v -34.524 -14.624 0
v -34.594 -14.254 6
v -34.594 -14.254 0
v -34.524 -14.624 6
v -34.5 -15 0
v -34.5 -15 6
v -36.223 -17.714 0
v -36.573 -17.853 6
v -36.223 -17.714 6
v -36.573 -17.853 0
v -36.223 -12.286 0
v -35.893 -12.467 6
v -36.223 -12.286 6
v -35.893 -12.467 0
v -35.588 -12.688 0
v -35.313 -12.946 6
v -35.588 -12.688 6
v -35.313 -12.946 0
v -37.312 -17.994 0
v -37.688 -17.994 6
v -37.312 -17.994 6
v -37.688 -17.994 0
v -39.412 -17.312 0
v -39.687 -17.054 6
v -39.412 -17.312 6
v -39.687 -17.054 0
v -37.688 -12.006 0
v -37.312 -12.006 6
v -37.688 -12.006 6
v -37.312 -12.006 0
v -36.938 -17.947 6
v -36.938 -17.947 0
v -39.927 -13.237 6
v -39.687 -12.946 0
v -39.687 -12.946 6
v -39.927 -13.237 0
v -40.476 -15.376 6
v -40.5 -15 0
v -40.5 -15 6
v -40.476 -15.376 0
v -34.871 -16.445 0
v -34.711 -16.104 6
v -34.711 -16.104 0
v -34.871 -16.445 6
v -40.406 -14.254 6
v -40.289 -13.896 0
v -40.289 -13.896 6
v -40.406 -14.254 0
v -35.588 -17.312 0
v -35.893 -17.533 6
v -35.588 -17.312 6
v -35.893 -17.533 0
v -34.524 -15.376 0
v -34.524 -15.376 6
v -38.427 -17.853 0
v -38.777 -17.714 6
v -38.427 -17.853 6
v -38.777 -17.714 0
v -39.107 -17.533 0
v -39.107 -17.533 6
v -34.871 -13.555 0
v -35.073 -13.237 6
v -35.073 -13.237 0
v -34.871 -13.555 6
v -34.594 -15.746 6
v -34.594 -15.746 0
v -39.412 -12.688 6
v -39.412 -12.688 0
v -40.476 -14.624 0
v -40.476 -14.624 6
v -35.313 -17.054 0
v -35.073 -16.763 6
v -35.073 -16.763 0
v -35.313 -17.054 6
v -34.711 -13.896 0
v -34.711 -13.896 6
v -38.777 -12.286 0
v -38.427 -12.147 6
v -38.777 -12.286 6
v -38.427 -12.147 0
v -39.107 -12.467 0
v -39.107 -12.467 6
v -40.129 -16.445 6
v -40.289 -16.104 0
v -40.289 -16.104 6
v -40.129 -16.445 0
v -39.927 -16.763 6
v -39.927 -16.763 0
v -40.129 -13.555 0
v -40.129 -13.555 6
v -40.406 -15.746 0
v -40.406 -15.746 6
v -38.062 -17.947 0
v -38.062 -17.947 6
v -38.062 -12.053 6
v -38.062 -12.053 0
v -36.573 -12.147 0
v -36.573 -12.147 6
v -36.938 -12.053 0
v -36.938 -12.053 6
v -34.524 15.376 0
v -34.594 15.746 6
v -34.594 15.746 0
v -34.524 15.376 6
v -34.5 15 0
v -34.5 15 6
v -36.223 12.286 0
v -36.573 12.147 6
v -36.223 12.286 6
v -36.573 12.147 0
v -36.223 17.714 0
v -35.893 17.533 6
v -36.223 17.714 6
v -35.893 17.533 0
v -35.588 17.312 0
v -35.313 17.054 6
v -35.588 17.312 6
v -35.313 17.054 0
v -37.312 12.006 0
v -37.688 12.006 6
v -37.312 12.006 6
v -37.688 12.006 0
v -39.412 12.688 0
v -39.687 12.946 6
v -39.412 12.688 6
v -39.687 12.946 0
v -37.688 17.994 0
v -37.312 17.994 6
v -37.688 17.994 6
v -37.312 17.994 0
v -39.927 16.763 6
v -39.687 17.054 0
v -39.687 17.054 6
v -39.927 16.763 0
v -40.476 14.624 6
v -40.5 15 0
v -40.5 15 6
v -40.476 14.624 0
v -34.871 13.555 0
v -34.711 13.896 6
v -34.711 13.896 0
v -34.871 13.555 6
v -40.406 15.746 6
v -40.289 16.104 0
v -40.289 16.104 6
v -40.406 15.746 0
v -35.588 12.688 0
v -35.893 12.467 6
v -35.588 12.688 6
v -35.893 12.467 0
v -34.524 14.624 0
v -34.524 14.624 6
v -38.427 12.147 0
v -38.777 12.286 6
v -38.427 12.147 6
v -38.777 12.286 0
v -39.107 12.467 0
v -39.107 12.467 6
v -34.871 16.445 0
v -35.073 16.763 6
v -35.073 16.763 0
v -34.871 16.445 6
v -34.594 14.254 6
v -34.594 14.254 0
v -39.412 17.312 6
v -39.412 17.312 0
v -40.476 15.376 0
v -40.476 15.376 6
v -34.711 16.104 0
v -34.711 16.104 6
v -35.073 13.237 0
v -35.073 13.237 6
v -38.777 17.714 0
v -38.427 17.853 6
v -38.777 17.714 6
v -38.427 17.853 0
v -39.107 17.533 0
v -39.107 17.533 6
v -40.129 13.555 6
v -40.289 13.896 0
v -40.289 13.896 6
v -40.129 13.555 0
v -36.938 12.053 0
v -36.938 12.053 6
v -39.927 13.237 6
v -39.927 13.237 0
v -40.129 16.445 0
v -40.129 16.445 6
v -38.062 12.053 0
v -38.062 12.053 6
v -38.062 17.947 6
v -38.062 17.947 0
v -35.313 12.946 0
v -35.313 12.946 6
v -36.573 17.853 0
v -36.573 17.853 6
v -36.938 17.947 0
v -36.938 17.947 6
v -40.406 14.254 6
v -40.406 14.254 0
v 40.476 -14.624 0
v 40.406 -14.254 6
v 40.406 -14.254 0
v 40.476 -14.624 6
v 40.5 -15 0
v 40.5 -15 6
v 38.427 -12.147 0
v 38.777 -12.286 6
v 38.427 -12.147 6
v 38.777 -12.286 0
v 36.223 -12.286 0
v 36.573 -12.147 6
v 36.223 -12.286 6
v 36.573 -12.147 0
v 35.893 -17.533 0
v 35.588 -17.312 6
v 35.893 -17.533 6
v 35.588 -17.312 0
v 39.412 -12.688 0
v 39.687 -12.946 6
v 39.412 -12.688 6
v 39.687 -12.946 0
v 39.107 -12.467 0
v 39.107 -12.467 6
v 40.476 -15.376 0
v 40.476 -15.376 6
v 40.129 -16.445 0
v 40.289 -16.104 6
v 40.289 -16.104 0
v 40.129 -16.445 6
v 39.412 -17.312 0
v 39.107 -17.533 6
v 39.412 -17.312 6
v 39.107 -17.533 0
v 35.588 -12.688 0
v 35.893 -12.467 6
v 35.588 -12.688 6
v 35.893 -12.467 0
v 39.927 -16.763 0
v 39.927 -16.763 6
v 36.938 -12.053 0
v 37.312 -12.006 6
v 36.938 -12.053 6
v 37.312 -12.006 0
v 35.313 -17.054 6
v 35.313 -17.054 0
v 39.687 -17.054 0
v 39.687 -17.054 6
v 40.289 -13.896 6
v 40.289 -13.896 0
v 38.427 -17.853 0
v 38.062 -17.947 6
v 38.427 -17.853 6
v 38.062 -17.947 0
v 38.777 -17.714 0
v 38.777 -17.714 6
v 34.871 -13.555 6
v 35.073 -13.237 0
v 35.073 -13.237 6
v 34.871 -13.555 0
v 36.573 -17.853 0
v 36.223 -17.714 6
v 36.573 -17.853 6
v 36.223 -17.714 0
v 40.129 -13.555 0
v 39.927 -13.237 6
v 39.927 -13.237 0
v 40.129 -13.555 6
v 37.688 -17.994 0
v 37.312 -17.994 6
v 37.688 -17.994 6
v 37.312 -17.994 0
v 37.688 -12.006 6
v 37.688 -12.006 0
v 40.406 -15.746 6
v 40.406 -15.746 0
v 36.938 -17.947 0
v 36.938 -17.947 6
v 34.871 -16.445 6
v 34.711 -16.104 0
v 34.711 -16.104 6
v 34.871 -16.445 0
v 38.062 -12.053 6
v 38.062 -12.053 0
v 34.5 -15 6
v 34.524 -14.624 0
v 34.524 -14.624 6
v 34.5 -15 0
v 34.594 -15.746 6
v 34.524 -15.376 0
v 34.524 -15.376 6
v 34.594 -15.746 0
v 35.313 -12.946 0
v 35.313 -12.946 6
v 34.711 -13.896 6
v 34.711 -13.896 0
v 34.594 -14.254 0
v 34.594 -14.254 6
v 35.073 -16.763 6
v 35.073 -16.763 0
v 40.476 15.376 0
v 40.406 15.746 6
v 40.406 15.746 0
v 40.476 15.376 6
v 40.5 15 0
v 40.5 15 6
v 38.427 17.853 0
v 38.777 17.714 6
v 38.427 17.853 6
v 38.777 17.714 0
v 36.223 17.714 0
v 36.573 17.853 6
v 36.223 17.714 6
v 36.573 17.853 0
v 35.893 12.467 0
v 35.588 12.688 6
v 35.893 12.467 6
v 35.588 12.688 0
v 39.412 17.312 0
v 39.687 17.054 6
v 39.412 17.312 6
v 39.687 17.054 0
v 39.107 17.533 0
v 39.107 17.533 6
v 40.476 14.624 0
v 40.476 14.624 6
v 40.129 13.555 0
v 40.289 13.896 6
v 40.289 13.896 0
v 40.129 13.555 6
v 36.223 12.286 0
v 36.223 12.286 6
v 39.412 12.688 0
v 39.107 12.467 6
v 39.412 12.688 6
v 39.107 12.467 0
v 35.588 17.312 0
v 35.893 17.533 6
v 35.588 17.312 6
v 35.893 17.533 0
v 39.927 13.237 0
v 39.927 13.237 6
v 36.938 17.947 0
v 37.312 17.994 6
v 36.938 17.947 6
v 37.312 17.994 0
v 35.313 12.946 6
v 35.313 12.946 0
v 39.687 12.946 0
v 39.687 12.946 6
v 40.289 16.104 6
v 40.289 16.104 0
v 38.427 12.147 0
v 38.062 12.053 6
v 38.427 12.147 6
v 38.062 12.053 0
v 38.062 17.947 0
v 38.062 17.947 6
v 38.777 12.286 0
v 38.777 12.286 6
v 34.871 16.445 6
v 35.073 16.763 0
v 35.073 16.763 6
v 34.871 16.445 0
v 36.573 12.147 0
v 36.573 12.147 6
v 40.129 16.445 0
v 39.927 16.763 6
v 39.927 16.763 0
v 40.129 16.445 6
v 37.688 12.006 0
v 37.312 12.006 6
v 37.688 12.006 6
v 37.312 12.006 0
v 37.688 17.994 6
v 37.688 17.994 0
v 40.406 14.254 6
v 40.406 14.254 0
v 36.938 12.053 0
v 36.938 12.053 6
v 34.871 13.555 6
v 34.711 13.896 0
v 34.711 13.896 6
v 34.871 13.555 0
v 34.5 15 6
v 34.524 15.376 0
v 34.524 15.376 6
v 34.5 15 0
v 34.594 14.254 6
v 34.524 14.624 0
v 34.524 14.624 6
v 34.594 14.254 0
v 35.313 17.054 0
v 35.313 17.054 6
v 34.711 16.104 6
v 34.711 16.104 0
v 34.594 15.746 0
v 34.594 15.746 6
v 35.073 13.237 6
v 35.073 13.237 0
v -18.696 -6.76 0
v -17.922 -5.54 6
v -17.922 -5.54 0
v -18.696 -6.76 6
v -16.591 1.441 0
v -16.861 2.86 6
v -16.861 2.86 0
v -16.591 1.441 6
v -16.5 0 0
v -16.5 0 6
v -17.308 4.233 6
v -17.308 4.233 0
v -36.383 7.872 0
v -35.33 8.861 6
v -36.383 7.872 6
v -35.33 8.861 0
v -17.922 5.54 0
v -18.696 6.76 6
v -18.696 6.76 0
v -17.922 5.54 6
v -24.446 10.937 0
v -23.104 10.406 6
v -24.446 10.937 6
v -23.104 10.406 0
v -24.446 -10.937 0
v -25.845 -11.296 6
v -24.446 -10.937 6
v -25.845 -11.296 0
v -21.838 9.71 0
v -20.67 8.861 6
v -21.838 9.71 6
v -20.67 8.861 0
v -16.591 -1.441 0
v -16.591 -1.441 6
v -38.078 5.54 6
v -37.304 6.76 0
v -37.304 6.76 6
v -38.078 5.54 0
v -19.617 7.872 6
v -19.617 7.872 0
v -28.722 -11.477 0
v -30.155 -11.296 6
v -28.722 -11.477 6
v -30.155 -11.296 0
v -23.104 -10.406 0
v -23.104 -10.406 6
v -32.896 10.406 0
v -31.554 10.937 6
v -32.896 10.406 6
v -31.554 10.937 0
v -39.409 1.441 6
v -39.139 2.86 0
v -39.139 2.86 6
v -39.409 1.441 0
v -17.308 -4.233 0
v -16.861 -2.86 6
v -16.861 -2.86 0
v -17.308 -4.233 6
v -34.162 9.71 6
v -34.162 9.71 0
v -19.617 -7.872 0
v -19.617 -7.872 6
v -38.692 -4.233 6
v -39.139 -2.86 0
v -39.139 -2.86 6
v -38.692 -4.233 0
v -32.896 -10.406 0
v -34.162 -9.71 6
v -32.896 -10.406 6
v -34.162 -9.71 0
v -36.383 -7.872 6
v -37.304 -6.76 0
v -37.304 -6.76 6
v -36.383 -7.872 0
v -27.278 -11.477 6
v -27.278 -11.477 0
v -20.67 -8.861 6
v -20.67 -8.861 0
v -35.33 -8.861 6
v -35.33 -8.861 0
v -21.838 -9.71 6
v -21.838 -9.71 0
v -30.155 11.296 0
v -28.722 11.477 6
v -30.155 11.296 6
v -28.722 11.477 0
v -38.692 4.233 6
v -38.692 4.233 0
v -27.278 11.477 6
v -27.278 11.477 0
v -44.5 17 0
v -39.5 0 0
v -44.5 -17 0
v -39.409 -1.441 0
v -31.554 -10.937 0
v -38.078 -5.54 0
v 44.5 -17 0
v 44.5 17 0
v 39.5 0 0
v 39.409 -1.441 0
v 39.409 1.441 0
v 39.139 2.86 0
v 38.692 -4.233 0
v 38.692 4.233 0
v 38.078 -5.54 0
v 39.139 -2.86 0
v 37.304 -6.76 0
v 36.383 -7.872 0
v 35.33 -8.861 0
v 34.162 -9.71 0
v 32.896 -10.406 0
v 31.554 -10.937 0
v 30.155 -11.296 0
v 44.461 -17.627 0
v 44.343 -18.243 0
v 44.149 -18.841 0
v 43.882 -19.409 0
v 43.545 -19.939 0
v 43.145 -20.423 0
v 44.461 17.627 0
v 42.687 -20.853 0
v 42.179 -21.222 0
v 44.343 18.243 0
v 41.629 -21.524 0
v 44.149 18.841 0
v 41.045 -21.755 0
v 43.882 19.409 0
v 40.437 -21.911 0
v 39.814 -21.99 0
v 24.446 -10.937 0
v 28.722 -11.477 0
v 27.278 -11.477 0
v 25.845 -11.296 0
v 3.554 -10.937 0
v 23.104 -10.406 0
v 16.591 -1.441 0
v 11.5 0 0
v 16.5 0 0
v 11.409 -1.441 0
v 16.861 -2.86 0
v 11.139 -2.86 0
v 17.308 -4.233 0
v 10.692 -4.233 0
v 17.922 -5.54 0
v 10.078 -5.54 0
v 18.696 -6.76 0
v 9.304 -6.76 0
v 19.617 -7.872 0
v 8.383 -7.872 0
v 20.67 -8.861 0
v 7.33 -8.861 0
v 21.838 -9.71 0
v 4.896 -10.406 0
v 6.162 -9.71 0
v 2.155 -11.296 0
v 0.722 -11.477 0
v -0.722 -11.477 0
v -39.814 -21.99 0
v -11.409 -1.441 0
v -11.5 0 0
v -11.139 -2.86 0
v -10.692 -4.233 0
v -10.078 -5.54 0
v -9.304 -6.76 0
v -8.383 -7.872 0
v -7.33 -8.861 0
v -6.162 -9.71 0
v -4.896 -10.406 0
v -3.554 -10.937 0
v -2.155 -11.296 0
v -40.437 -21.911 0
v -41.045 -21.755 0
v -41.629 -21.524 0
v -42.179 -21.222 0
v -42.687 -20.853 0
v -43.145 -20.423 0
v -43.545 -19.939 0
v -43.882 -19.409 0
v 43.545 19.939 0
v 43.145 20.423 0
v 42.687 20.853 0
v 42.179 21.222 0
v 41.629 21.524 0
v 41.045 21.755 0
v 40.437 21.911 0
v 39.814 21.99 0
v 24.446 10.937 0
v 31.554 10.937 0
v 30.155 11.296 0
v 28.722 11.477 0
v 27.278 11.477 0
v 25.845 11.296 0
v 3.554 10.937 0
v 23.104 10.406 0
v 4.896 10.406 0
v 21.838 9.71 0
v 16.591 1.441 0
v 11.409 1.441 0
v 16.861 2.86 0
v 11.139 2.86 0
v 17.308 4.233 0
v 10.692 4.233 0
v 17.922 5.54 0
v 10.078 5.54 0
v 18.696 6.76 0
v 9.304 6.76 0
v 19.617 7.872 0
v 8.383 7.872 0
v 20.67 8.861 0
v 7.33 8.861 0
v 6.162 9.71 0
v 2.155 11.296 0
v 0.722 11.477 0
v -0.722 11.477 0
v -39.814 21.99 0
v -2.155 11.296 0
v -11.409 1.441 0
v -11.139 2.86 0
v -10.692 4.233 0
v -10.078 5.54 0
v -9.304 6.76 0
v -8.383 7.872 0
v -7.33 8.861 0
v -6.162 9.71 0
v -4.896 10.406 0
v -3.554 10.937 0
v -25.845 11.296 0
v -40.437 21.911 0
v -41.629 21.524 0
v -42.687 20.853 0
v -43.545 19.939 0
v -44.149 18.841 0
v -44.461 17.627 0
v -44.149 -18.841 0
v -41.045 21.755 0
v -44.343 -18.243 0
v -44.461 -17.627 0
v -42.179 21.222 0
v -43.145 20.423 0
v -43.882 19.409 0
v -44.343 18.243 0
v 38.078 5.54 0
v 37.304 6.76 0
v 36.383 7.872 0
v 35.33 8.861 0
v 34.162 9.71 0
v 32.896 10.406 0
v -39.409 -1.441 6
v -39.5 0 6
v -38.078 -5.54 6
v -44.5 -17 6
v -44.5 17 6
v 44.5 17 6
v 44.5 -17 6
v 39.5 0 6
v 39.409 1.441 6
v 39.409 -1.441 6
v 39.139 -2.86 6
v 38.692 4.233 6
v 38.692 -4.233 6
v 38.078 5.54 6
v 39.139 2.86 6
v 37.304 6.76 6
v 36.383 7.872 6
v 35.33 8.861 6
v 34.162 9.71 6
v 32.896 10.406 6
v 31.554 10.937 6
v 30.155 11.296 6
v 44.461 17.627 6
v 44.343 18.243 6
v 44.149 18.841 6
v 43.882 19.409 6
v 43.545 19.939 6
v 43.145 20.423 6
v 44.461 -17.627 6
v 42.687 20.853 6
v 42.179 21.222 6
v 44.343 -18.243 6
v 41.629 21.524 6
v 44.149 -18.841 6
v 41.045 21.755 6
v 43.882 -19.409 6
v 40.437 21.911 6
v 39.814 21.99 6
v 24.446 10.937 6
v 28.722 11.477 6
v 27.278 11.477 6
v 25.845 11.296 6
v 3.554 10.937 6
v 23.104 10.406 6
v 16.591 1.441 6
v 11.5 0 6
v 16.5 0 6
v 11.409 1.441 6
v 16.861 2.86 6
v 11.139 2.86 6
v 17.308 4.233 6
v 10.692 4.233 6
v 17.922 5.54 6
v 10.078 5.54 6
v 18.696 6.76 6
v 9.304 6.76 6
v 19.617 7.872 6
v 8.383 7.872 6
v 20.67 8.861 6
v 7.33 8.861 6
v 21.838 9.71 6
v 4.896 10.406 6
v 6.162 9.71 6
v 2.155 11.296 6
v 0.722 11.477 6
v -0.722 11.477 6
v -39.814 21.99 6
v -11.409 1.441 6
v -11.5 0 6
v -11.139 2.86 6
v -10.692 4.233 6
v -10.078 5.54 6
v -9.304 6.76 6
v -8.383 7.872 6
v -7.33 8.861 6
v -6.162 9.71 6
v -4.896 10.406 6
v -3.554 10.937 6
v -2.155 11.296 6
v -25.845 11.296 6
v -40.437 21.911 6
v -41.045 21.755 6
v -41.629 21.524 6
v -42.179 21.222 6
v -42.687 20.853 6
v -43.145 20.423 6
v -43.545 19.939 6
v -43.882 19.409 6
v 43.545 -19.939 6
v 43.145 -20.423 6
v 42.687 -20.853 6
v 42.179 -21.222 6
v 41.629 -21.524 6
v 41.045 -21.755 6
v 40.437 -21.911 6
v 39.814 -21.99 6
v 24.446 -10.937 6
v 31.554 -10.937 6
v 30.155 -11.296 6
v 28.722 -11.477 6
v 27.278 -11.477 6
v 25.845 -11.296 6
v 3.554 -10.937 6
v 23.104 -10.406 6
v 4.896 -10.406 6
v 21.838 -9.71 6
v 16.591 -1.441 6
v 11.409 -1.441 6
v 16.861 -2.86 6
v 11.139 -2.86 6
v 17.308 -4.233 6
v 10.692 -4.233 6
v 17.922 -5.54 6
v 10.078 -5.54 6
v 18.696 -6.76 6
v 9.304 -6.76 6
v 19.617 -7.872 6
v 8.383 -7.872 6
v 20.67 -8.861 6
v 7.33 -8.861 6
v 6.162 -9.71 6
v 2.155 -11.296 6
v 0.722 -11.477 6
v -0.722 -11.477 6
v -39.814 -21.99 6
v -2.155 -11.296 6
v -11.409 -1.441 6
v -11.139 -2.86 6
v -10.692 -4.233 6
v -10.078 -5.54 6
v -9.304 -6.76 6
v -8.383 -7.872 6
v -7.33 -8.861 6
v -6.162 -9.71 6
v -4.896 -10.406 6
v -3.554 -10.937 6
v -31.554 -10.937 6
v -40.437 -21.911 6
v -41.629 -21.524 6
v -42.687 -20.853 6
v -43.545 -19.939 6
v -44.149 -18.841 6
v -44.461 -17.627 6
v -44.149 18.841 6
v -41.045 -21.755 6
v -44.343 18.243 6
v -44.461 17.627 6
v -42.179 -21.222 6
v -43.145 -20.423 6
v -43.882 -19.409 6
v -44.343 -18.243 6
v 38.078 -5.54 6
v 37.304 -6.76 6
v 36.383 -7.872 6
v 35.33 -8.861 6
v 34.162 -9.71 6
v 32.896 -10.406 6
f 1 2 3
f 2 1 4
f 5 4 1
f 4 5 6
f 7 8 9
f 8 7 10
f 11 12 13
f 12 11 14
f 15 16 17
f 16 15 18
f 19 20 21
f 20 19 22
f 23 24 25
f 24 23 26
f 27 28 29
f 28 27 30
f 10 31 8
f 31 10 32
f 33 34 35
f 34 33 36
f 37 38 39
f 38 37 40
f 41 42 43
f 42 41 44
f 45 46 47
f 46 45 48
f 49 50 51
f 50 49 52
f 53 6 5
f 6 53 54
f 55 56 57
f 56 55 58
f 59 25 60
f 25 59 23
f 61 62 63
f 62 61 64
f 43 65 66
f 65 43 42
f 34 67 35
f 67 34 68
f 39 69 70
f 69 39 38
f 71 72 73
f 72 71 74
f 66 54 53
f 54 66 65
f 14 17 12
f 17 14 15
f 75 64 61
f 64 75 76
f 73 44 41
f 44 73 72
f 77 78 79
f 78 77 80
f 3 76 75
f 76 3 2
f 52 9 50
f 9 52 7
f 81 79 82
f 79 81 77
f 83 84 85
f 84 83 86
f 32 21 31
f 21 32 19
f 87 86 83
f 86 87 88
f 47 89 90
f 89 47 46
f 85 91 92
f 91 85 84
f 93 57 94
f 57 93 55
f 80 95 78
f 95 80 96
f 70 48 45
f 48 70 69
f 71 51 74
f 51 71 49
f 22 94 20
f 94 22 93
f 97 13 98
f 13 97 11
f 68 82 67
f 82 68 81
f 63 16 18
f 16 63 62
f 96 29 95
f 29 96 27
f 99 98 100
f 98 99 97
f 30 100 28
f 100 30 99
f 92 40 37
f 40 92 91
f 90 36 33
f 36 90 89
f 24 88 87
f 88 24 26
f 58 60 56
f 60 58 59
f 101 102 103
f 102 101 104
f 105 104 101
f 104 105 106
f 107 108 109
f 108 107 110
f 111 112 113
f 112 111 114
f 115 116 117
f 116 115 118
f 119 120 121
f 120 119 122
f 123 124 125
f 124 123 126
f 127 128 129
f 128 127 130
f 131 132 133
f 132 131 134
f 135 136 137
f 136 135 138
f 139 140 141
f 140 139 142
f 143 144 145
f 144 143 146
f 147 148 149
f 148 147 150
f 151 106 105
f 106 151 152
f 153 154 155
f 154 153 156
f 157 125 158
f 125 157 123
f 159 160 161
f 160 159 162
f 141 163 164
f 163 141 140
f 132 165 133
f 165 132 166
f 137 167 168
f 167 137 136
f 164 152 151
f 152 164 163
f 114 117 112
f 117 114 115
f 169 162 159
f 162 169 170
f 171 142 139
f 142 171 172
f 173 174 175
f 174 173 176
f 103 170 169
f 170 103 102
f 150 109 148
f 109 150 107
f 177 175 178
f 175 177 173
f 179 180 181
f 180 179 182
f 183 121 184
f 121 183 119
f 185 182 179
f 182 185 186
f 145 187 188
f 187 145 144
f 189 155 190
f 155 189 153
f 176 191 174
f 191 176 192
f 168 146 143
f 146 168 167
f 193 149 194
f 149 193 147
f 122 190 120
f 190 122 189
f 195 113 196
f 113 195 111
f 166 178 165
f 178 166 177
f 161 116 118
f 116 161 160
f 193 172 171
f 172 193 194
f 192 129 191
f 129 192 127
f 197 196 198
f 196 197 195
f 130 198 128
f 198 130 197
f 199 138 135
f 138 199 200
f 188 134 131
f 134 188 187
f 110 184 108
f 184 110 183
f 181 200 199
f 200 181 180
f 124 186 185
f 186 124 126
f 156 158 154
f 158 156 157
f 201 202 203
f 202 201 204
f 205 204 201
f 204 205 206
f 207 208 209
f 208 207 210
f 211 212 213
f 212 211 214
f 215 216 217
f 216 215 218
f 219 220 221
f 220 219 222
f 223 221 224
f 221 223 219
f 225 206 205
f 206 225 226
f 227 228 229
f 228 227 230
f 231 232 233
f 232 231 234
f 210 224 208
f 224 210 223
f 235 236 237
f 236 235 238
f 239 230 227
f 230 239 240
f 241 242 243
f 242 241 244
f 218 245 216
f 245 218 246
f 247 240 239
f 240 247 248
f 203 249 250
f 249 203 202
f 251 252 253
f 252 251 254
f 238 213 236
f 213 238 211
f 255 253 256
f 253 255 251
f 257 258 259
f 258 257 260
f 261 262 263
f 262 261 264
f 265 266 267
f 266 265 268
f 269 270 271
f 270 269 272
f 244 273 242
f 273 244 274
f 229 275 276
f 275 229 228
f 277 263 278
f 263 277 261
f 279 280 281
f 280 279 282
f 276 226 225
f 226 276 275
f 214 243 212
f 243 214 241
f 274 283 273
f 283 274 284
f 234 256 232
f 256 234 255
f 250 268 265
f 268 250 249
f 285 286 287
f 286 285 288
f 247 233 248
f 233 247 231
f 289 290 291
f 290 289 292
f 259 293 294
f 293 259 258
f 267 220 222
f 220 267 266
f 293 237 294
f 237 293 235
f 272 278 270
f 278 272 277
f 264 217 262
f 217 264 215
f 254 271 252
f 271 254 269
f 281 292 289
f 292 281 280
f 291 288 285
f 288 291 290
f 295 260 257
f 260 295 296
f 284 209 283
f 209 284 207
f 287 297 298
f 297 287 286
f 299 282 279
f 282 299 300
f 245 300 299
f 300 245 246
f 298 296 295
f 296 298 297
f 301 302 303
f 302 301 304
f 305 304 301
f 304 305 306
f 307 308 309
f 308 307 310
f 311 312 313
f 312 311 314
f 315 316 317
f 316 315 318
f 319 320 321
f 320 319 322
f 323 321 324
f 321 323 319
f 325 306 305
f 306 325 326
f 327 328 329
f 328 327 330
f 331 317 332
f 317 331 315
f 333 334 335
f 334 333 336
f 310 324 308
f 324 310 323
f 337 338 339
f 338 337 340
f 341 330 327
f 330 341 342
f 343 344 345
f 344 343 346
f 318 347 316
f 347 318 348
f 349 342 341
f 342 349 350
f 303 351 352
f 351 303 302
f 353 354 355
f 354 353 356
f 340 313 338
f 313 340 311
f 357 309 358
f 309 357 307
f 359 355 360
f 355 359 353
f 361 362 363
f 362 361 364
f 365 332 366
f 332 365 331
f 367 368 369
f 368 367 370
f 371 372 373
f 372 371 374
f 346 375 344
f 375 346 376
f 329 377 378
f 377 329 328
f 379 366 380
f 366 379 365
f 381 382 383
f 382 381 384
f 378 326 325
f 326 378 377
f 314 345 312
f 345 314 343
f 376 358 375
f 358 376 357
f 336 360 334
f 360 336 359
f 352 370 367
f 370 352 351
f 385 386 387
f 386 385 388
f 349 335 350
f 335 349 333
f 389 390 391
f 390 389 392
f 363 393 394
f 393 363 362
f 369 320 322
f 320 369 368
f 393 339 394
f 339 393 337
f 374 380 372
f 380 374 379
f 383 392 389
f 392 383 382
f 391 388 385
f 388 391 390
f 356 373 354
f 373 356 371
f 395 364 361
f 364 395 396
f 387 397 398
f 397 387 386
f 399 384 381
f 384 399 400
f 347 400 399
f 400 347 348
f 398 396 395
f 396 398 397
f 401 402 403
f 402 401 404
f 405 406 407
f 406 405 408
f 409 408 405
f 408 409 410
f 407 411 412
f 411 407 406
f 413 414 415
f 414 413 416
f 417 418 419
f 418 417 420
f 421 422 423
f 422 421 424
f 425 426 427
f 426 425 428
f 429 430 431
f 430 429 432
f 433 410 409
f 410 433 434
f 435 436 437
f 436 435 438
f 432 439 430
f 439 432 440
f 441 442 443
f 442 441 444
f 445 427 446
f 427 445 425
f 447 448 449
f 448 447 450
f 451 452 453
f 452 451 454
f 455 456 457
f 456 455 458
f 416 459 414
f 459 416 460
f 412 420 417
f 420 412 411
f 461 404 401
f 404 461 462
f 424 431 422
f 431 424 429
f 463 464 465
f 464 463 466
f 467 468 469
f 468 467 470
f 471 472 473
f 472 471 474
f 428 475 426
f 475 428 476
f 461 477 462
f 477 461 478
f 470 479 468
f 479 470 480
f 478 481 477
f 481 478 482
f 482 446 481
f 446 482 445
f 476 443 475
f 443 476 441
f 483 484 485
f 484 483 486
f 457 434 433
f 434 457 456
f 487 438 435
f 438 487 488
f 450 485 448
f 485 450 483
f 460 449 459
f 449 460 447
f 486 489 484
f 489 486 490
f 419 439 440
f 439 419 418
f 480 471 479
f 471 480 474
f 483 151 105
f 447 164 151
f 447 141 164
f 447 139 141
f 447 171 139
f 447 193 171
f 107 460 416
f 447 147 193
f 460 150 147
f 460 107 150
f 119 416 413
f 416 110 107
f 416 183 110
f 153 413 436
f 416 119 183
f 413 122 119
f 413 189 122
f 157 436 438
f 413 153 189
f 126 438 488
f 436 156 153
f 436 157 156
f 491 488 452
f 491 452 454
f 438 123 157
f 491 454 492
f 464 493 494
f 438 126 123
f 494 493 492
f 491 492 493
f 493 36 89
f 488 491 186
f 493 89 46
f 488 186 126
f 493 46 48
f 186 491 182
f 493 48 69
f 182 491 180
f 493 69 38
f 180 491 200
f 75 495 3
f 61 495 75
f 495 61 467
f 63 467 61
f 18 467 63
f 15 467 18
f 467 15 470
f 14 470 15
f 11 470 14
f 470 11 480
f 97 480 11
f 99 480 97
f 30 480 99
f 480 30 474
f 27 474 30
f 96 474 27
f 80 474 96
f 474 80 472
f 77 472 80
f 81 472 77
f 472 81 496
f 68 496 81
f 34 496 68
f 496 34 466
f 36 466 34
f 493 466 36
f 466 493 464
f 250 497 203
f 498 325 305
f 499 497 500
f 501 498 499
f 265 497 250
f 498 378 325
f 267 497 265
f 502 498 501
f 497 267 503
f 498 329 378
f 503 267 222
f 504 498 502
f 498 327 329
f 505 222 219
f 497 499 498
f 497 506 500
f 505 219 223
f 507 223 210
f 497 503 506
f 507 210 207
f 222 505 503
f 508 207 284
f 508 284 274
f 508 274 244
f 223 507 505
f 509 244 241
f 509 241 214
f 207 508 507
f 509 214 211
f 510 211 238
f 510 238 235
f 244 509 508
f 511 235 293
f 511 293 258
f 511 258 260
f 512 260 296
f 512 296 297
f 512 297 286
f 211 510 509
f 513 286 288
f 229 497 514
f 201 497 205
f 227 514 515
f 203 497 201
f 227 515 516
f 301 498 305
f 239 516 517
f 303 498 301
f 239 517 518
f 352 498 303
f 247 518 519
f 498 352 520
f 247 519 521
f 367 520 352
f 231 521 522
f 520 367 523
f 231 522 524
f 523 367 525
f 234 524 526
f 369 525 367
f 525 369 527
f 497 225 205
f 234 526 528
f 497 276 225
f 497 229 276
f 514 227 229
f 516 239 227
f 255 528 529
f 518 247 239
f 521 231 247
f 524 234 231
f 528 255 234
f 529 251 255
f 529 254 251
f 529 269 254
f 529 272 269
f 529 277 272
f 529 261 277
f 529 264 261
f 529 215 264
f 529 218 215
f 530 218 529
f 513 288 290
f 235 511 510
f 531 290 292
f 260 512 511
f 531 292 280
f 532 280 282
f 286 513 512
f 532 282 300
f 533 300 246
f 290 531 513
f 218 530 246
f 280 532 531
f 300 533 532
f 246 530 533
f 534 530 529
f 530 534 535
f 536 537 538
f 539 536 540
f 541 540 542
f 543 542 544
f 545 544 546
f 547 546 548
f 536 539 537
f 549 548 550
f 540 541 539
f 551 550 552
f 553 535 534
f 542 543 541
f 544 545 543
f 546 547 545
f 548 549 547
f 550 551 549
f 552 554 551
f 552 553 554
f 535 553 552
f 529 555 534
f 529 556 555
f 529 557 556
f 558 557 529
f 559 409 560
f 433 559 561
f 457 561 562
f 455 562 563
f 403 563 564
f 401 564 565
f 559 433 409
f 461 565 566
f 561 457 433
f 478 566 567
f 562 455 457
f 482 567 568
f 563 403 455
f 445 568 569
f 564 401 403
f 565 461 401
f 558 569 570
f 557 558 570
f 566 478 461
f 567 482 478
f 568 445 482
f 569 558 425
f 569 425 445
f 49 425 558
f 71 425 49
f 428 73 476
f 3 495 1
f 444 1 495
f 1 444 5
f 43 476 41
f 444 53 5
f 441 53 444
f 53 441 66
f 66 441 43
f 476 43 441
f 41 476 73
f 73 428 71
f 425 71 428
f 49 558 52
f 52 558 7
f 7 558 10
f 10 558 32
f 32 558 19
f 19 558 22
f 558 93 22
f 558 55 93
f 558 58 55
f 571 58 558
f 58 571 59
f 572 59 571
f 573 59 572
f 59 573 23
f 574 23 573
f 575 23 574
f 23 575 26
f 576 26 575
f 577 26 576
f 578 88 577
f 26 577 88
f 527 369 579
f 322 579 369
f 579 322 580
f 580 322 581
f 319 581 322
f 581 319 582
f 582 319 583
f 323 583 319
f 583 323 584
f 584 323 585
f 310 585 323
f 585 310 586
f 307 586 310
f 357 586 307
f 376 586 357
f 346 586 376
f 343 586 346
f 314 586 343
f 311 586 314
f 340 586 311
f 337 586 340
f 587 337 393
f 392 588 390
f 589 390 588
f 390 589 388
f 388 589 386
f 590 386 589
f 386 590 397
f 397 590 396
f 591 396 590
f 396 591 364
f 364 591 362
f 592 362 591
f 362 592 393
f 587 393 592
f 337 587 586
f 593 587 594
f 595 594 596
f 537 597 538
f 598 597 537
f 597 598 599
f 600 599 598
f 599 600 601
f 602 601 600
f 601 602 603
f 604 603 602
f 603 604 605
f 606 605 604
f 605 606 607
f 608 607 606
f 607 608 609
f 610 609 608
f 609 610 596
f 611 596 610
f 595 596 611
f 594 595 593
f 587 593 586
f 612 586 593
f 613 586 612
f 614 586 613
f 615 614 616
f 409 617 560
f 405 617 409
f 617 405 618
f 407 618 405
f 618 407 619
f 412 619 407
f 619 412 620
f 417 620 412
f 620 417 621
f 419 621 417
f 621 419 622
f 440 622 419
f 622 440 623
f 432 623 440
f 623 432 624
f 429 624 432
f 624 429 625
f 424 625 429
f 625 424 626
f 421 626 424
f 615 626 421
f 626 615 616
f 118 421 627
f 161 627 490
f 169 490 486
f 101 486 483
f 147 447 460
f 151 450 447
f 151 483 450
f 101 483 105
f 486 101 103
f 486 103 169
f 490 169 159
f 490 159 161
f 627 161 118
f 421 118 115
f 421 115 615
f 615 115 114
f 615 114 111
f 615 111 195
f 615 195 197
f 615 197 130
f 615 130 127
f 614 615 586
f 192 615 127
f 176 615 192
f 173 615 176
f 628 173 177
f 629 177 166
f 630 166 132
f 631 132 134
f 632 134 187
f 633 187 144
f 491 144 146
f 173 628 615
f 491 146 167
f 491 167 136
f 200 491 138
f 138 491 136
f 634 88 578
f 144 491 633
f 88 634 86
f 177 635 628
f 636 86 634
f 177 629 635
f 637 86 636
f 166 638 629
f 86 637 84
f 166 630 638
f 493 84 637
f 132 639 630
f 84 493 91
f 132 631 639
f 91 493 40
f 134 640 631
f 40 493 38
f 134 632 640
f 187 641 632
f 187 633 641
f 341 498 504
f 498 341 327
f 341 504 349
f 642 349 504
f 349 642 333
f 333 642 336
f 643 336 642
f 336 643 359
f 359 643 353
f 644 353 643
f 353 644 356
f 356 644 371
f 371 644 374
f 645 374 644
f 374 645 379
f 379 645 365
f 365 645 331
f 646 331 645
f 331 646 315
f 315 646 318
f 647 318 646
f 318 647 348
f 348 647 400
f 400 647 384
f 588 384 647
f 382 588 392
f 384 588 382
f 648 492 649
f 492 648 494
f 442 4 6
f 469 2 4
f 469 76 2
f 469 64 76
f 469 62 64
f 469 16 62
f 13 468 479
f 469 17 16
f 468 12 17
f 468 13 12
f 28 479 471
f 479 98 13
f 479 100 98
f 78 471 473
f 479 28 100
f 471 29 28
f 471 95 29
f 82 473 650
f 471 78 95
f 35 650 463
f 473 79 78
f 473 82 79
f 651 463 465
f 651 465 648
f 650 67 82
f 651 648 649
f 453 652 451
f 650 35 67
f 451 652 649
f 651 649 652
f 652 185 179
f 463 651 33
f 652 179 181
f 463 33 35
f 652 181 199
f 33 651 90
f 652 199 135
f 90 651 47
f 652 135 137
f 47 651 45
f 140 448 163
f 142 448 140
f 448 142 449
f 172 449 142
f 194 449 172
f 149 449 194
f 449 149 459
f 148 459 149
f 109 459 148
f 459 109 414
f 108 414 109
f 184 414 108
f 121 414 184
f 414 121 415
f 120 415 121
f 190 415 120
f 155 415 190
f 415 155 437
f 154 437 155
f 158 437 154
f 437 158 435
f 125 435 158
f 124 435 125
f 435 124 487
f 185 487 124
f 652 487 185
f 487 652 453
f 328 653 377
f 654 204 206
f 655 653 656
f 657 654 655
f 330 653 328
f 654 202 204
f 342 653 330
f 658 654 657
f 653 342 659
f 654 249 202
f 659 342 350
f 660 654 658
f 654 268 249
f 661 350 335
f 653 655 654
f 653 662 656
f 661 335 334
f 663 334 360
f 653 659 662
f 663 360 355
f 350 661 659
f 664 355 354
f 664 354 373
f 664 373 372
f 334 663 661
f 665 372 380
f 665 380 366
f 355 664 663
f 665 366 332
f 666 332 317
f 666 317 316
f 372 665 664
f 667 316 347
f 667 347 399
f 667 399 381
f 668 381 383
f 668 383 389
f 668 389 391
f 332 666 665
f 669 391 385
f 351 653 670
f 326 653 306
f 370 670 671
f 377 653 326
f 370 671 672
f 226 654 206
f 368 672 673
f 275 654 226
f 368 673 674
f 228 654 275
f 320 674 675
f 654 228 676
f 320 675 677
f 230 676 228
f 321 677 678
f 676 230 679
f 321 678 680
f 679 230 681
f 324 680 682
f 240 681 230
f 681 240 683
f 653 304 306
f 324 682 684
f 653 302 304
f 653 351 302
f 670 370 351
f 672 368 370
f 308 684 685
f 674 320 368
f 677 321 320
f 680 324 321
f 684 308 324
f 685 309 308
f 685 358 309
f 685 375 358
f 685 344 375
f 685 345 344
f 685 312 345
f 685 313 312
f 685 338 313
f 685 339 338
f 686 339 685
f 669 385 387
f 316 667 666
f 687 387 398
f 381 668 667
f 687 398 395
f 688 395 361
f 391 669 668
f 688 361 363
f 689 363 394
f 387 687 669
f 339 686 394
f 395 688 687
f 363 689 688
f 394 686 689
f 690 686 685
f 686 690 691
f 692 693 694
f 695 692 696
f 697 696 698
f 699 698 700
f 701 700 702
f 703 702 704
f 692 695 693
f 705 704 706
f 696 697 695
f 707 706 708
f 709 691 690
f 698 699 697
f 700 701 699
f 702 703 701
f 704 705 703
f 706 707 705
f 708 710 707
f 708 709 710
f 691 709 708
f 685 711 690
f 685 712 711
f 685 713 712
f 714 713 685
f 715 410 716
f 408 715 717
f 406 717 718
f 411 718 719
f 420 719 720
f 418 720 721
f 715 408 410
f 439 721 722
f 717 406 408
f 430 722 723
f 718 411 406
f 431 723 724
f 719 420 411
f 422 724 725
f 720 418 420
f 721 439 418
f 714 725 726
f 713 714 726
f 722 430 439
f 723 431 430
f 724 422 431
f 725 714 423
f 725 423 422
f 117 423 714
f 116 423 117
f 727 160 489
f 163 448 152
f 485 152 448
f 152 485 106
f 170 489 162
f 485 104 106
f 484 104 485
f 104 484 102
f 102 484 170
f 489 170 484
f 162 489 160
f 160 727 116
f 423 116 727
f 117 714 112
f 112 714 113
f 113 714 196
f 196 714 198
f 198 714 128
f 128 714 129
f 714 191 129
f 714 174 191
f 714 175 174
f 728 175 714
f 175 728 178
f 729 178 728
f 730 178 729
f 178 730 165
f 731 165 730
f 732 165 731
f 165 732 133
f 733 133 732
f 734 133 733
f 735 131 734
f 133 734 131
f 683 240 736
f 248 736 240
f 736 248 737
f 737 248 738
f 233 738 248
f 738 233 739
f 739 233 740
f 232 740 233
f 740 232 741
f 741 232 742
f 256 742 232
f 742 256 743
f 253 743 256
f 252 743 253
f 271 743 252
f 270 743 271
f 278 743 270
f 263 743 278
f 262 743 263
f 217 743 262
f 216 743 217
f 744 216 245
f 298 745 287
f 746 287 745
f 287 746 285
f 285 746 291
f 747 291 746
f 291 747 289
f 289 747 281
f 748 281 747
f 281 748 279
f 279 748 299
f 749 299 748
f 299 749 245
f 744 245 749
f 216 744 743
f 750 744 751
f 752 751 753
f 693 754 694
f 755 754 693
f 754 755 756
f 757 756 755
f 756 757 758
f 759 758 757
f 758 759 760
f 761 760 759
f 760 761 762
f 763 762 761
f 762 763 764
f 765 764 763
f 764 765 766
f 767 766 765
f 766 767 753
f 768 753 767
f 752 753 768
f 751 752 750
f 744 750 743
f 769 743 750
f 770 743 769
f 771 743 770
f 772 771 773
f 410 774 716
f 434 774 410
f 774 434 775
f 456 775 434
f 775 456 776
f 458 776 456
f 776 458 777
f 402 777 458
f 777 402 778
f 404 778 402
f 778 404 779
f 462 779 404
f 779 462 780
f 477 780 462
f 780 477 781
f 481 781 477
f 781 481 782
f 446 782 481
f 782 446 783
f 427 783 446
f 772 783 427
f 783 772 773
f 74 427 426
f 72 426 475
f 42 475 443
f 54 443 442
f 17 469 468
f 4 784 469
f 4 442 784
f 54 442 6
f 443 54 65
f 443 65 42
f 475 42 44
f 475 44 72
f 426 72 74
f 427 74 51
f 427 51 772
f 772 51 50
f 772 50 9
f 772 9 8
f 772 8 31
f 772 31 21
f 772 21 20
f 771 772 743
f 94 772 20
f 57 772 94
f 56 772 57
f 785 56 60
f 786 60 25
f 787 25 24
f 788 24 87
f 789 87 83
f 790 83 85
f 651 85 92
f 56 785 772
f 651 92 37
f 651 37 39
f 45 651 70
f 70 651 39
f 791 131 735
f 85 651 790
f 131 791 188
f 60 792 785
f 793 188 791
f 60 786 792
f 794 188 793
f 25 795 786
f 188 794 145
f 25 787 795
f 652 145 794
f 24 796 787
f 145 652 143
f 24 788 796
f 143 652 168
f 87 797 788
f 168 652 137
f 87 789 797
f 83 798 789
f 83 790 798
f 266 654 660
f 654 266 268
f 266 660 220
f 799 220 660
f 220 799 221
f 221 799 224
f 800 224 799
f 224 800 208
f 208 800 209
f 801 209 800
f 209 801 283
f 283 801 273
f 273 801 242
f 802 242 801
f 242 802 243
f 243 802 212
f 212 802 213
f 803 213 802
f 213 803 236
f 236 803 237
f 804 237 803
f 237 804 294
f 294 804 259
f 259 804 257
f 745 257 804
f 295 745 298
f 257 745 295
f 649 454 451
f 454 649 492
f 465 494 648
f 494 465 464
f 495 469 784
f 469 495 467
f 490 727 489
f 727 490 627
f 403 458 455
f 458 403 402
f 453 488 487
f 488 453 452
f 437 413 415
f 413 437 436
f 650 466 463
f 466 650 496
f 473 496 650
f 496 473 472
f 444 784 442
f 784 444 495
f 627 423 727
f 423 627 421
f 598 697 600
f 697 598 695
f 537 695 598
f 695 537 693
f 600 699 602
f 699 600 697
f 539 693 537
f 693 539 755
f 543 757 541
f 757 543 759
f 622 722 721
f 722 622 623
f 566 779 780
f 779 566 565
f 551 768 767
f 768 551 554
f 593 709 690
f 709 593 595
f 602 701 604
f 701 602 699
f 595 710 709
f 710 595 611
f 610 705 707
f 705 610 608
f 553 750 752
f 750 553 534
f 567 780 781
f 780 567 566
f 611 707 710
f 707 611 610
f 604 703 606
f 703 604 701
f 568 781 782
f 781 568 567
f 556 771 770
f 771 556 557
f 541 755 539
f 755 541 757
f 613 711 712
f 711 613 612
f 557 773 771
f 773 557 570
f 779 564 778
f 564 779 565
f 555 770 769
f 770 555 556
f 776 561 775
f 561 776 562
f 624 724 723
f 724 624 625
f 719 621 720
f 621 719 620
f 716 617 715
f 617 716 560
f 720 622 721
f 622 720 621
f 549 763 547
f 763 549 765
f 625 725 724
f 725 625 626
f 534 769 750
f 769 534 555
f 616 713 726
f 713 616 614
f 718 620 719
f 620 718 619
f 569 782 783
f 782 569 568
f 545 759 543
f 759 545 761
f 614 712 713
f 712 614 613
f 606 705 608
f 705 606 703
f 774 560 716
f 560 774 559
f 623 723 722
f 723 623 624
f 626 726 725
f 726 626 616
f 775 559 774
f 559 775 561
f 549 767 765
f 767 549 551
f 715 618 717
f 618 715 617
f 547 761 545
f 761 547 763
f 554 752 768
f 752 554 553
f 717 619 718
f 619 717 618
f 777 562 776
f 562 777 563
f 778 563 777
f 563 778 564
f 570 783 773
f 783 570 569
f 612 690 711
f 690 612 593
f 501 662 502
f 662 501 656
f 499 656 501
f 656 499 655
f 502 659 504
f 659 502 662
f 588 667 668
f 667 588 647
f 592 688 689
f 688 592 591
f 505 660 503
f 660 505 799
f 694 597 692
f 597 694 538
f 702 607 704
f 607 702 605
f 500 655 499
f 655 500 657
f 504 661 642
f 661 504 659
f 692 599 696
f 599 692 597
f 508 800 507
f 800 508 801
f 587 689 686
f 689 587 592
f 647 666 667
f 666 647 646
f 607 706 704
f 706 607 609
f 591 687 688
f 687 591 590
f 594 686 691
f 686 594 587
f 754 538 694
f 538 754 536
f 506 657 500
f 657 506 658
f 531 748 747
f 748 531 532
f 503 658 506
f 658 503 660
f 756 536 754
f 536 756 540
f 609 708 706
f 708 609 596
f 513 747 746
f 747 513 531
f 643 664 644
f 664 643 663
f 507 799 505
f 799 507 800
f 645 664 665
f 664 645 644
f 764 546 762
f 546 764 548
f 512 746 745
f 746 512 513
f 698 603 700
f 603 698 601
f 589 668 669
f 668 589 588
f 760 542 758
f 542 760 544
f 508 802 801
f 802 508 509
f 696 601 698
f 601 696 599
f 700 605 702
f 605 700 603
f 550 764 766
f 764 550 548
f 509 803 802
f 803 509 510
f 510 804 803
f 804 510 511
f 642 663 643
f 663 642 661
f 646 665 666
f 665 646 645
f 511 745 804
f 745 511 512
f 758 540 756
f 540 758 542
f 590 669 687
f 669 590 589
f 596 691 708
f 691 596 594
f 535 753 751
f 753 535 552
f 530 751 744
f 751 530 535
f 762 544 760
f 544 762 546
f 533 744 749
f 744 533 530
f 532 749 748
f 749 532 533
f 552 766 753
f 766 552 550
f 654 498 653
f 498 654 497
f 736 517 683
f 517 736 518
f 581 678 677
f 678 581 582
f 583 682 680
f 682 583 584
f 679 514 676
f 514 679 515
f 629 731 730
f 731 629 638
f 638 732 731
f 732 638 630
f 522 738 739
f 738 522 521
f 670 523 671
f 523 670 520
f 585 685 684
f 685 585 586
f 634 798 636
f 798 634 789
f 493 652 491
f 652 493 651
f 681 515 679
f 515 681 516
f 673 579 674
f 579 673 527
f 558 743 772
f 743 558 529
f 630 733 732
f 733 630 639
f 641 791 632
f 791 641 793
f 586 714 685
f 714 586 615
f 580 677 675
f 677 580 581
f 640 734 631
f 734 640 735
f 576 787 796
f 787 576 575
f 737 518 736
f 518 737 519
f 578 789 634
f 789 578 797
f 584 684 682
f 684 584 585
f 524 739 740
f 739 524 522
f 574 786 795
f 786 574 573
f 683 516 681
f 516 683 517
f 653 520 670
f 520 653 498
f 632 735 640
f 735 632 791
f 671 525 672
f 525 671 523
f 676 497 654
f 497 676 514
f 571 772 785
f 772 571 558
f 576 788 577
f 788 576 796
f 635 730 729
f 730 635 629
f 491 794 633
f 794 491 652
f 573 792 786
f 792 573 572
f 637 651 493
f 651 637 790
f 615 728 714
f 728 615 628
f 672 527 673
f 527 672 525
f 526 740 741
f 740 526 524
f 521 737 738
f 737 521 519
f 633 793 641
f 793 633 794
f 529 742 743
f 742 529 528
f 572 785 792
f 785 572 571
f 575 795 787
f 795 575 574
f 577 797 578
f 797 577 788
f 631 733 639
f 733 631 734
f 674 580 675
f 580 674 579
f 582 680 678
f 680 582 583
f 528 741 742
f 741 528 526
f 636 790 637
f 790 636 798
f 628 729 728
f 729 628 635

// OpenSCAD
$fn = 50;


difference() {
	union() {
		hull() {
			translate(v = [-39.5000000000, 17.0000000000, 0]) {
				cylinder(h = 6, r = 5);
			}
			translate(v = [39.5000000000, 17.0000000000, 0]) {
				cylinder(h = 6, r = 5);
			}
			translate(v = [-39.5000000000, -17.0000000000, 0]) {
				cylinder(h = 6, r = 5);
			}
			translate(v = [39.5000000000, -17.0000000000, 0]) {
				cylinder(h = 6, r = 5);
			}
		}
	}
	union() {
		#translate(v = [-37.5000000000, -15.0000000000, -100.0000000000]) {
			cylinder(h = 200, r = 3.0000000000);
		}
		#translate(v = [-37.5000000000, 15.0000000000, -100.0000000000]) {
			cylinder(h = 200, r = 3.0000000000);
		}
		#translate(v = [37.5000000000, -15.0000000000, -100.0000000000]) {
			cylinder(h = 200, r = 3.0000000000);
		}
		#translate(v = [37.5000000000, 15.0000000000, -100.0000000000]) {
			cylinder(h = 200, r = 3.0000000000);
		}
		#translate(v = [-28.0000000000, 0, 0]) {
			cylinder(h = 6, r = 11.5000000000);
		}
		#cylinder(h = 6, r = 11.5000000000);
		#translate(v = [28.0000000000, 0, 0]) {
			cylinder(h = 6, r = 11.5000000000);
		}
	}
}
